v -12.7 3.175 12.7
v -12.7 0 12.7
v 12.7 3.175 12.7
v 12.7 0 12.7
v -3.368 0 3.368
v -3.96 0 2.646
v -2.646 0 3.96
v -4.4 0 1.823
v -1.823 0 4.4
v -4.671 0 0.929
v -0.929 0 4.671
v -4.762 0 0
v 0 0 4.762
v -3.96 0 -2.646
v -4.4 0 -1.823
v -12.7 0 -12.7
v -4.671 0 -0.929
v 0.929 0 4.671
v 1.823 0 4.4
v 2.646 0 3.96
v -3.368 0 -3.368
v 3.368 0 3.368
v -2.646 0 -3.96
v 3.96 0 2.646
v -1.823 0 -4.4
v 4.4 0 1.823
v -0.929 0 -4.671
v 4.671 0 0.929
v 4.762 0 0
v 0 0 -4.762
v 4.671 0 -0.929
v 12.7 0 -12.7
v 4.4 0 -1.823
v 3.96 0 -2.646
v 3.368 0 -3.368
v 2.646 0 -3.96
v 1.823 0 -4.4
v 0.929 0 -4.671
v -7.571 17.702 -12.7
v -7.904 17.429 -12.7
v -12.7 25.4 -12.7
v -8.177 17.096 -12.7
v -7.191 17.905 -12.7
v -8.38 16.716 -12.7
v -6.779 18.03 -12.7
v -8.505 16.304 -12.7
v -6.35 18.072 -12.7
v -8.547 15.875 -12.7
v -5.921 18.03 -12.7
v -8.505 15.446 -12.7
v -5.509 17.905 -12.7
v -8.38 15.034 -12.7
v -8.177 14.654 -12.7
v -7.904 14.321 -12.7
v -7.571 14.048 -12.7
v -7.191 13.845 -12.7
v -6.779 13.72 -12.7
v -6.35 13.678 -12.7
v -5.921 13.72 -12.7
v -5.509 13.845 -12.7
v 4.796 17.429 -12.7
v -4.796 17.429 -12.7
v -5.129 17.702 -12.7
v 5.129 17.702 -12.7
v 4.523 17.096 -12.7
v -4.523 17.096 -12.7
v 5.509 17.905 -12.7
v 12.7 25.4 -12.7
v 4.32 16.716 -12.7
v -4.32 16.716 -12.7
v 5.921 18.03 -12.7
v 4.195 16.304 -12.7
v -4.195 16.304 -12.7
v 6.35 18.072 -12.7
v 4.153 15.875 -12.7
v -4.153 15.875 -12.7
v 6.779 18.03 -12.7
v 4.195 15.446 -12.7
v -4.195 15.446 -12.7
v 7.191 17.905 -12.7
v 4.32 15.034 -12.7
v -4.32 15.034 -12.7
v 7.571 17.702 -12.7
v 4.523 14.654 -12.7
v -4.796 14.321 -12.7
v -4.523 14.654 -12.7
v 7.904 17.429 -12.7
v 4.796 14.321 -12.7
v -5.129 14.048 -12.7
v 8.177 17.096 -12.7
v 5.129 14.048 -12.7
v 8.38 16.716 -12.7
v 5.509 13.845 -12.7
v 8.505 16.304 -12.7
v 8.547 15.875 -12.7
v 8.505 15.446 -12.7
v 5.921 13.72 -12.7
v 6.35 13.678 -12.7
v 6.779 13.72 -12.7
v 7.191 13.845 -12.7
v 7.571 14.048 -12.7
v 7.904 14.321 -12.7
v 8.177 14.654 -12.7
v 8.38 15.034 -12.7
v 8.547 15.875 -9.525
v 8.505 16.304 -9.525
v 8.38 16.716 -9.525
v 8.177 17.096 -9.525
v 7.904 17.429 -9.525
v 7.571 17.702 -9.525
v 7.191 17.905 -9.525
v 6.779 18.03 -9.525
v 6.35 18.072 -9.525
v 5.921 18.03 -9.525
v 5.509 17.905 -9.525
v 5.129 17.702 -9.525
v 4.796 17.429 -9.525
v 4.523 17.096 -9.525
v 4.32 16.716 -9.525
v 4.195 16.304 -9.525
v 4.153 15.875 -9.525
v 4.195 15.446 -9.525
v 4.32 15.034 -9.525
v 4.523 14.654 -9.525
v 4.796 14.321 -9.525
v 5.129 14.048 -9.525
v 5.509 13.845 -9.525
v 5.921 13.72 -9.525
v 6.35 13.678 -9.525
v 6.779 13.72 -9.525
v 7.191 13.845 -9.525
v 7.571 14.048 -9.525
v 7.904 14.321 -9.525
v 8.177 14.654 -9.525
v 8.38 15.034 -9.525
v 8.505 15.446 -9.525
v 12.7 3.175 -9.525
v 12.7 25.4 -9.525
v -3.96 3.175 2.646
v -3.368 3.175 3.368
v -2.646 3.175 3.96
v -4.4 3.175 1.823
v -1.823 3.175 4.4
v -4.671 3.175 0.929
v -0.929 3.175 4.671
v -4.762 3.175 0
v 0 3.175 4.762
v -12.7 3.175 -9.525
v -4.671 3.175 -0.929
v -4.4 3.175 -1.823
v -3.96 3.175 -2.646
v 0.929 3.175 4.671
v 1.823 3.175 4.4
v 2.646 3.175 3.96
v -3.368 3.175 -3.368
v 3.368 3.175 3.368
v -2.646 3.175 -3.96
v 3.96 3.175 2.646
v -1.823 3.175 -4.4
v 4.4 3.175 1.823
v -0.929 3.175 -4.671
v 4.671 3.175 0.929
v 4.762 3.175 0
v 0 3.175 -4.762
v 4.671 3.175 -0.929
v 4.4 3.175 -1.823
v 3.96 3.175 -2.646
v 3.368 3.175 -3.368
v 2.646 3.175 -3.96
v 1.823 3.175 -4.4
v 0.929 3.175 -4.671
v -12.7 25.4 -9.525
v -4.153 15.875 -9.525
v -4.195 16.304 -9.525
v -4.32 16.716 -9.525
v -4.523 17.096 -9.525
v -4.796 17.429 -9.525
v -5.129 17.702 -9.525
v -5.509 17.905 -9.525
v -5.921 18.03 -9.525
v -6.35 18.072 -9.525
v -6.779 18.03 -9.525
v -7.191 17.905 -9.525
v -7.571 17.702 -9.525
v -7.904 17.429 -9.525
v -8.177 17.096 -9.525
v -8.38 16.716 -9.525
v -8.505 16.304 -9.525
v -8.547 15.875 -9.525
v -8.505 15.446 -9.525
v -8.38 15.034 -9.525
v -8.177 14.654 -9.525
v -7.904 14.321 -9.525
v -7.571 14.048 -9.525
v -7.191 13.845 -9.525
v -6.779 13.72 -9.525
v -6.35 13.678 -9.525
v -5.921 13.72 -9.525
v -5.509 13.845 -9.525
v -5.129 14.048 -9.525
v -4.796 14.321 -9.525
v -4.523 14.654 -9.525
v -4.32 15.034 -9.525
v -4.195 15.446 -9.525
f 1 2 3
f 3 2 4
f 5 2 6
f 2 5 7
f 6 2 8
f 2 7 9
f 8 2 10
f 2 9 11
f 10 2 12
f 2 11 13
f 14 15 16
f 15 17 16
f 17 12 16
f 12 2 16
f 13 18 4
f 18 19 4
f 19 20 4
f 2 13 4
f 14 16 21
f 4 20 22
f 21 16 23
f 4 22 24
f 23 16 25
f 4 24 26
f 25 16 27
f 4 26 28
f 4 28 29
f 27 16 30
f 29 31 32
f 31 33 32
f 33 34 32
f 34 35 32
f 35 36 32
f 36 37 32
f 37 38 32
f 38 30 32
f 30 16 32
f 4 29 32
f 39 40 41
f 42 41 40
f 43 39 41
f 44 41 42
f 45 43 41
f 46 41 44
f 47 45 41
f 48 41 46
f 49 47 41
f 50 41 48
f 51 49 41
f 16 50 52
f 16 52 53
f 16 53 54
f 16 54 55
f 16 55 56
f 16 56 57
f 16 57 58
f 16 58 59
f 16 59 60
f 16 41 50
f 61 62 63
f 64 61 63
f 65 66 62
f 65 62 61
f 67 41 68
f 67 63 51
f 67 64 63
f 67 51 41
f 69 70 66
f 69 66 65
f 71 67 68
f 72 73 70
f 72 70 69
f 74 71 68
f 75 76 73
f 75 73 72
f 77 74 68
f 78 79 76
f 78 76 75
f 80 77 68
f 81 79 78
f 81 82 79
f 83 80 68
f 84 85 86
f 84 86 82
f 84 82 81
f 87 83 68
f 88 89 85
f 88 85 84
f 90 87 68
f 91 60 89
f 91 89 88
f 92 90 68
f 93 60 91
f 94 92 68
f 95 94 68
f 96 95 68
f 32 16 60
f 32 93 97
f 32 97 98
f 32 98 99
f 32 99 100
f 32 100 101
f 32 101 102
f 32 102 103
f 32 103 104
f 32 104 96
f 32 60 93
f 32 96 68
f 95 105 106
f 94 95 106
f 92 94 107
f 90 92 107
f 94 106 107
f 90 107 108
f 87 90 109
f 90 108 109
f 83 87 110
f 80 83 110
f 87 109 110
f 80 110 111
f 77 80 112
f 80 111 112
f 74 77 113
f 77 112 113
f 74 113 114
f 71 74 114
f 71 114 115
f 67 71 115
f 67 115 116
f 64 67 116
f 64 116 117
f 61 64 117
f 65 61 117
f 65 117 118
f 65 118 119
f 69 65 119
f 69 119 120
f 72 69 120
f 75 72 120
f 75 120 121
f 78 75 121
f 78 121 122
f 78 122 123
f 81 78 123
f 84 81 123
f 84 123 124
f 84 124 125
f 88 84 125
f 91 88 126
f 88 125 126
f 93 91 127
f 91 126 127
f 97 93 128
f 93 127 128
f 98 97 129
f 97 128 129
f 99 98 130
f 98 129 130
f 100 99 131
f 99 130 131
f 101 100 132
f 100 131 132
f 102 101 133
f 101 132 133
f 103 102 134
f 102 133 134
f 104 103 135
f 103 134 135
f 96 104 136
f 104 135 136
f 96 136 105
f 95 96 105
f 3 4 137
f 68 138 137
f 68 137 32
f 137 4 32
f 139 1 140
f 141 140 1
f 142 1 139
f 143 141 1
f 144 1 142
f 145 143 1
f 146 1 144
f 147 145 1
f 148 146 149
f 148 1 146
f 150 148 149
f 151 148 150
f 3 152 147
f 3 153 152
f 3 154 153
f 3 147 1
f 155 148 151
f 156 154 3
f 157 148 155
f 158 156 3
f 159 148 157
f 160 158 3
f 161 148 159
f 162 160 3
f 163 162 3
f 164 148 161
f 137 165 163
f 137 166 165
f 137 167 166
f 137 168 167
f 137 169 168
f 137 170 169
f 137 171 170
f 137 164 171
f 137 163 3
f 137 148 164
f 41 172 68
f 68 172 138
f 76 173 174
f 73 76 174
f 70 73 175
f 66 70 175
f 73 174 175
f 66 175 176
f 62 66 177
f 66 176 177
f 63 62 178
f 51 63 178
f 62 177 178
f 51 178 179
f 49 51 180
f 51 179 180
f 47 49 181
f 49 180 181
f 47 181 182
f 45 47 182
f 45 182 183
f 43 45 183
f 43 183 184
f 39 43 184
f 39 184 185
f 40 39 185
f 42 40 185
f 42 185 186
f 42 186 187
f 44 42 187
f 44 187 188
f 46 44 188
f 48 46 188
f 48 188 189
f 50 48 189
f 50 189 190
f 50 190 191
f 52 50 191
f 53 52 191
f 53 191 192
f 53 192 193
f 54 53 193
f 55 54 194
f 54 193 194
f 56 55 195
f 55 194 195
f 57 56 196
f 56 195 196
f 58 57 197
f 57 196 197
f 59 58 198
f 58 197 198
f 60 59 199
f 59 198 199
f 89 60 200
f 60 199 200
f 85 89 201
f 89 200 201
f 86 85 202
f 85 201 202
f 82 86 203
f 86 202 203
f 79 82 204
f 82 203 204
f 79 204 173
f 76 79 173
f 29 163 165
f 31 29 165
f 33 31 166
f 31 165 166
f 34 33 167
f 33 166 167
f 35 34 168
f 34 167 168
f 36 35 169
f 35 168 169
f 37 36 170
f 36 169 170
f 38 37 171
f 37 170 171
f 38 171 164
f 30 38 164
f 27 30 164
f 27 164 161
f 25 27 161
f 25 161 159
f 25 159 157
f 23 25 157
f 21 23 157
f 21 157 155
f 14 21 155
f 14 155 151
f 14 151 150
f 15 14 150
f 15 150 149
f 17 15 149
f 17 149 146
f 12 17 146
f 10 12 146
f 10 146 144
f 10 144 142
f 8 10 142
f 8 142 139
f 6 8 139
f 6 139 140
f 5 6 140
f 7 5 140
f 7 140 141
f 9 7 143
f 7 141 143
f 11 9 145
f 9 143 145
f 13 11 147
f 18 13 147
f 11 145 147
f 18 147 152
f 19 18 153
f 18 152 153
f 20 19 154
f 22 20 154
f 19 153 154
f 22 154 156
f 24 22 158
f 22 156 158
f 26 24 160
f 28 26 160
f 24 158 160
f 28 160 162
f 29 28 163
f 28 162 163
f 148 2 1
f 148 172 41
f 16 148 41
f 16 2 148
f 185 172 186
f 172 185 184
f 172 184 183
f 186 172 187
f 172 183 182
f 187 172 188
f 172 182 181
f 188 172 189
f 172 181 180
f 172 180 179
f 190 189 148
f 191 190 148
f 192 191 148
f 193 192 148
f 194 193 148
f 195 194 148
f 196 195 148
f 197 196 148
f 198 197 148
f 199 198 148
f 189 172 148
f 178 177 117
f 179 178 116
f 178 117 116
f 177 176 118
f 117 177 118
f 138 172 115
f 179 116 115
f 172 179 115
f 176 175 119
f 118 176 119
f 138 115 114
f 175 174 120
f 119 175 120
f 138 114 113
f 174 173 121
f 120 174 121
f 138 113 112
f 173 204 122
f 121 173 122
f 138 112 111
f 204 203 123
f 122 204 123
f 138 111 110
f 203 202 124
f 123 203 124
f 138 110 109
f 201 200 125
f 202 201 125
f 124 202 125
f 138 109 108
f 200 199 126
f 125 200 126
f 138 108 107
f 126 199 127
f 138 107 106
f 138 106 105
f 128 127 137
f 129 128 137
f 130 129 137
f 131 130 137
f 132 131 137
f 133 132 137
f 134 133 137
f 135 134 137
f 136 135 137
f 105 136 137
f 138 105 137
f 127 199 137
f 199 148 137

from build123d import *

# Parameters (mm, degrees)
SKETCH1_W           = 25.4
SKETCH1_H           = 25.4
BOSS_EXTRUDE1_DEPTH = 3.175
SKETCH2_W           = 25.4
SKETCH2_H           = 3.175
BOSS_EXTRUDE2_DEPTH = 25.4
SKETCH3_R           = 4.7625
CUT_EXTRUDE1_DEPTH  = 4.175
SKETCH4_R           = 2.1971
CUT_EXTRUDE2_DEPTH  = 4.175


with BuildPart() as part:
    # Sketch1 → Boss-Extrude1 (new body)
    with BuildSketch(Plane(origin=(0, 0, 0), x_dir=(1, 0, 0), z_dir=(0, 1, 0))):
        Rectangle(SKETCH1_W, SKETCH1_H)
    extrude(amount=BOSS_EXTRUDE1_DEPTH)

    # Sketch2 → Boss-Extrude2 (add)
    with BuildSketch(Plane.XZ):
        with Locations((0, -11.1125)):
            Rectangle(SKETCH2_W, SKETCH2_H)
    extrude(amount=-BOSS_EXTRUDE2_DEPTH)

    # Sketch3 → Cut-Extrude1 (cut, through all)
    with BuildSketch(Plane(origin=(0, 3.175, 0), x_dir=(1, 0, 0), z_dir=(0, 1, 0))):
        Circle(SKETCH3_R)
    extrude(amount=-CUT_EXTRUDE1_DEPTH, mode=Mode.SUBTRACT)

    # Sketch4 → Cut-Extrude2 (cut, through all)
    with BuildSketch(Plane.XY.offset(-9.525)):
        with Locations((-6.35, 15.875)):
            Circle(SKETCH4_R)
        with Locations((6.35, 15.875)):
            Circle(SKETCH4_R)
    extrude(amount=-CUT_EXTRUDE2_DEPTH, mode=Mode.SUBTRACT)


solid = part.part
